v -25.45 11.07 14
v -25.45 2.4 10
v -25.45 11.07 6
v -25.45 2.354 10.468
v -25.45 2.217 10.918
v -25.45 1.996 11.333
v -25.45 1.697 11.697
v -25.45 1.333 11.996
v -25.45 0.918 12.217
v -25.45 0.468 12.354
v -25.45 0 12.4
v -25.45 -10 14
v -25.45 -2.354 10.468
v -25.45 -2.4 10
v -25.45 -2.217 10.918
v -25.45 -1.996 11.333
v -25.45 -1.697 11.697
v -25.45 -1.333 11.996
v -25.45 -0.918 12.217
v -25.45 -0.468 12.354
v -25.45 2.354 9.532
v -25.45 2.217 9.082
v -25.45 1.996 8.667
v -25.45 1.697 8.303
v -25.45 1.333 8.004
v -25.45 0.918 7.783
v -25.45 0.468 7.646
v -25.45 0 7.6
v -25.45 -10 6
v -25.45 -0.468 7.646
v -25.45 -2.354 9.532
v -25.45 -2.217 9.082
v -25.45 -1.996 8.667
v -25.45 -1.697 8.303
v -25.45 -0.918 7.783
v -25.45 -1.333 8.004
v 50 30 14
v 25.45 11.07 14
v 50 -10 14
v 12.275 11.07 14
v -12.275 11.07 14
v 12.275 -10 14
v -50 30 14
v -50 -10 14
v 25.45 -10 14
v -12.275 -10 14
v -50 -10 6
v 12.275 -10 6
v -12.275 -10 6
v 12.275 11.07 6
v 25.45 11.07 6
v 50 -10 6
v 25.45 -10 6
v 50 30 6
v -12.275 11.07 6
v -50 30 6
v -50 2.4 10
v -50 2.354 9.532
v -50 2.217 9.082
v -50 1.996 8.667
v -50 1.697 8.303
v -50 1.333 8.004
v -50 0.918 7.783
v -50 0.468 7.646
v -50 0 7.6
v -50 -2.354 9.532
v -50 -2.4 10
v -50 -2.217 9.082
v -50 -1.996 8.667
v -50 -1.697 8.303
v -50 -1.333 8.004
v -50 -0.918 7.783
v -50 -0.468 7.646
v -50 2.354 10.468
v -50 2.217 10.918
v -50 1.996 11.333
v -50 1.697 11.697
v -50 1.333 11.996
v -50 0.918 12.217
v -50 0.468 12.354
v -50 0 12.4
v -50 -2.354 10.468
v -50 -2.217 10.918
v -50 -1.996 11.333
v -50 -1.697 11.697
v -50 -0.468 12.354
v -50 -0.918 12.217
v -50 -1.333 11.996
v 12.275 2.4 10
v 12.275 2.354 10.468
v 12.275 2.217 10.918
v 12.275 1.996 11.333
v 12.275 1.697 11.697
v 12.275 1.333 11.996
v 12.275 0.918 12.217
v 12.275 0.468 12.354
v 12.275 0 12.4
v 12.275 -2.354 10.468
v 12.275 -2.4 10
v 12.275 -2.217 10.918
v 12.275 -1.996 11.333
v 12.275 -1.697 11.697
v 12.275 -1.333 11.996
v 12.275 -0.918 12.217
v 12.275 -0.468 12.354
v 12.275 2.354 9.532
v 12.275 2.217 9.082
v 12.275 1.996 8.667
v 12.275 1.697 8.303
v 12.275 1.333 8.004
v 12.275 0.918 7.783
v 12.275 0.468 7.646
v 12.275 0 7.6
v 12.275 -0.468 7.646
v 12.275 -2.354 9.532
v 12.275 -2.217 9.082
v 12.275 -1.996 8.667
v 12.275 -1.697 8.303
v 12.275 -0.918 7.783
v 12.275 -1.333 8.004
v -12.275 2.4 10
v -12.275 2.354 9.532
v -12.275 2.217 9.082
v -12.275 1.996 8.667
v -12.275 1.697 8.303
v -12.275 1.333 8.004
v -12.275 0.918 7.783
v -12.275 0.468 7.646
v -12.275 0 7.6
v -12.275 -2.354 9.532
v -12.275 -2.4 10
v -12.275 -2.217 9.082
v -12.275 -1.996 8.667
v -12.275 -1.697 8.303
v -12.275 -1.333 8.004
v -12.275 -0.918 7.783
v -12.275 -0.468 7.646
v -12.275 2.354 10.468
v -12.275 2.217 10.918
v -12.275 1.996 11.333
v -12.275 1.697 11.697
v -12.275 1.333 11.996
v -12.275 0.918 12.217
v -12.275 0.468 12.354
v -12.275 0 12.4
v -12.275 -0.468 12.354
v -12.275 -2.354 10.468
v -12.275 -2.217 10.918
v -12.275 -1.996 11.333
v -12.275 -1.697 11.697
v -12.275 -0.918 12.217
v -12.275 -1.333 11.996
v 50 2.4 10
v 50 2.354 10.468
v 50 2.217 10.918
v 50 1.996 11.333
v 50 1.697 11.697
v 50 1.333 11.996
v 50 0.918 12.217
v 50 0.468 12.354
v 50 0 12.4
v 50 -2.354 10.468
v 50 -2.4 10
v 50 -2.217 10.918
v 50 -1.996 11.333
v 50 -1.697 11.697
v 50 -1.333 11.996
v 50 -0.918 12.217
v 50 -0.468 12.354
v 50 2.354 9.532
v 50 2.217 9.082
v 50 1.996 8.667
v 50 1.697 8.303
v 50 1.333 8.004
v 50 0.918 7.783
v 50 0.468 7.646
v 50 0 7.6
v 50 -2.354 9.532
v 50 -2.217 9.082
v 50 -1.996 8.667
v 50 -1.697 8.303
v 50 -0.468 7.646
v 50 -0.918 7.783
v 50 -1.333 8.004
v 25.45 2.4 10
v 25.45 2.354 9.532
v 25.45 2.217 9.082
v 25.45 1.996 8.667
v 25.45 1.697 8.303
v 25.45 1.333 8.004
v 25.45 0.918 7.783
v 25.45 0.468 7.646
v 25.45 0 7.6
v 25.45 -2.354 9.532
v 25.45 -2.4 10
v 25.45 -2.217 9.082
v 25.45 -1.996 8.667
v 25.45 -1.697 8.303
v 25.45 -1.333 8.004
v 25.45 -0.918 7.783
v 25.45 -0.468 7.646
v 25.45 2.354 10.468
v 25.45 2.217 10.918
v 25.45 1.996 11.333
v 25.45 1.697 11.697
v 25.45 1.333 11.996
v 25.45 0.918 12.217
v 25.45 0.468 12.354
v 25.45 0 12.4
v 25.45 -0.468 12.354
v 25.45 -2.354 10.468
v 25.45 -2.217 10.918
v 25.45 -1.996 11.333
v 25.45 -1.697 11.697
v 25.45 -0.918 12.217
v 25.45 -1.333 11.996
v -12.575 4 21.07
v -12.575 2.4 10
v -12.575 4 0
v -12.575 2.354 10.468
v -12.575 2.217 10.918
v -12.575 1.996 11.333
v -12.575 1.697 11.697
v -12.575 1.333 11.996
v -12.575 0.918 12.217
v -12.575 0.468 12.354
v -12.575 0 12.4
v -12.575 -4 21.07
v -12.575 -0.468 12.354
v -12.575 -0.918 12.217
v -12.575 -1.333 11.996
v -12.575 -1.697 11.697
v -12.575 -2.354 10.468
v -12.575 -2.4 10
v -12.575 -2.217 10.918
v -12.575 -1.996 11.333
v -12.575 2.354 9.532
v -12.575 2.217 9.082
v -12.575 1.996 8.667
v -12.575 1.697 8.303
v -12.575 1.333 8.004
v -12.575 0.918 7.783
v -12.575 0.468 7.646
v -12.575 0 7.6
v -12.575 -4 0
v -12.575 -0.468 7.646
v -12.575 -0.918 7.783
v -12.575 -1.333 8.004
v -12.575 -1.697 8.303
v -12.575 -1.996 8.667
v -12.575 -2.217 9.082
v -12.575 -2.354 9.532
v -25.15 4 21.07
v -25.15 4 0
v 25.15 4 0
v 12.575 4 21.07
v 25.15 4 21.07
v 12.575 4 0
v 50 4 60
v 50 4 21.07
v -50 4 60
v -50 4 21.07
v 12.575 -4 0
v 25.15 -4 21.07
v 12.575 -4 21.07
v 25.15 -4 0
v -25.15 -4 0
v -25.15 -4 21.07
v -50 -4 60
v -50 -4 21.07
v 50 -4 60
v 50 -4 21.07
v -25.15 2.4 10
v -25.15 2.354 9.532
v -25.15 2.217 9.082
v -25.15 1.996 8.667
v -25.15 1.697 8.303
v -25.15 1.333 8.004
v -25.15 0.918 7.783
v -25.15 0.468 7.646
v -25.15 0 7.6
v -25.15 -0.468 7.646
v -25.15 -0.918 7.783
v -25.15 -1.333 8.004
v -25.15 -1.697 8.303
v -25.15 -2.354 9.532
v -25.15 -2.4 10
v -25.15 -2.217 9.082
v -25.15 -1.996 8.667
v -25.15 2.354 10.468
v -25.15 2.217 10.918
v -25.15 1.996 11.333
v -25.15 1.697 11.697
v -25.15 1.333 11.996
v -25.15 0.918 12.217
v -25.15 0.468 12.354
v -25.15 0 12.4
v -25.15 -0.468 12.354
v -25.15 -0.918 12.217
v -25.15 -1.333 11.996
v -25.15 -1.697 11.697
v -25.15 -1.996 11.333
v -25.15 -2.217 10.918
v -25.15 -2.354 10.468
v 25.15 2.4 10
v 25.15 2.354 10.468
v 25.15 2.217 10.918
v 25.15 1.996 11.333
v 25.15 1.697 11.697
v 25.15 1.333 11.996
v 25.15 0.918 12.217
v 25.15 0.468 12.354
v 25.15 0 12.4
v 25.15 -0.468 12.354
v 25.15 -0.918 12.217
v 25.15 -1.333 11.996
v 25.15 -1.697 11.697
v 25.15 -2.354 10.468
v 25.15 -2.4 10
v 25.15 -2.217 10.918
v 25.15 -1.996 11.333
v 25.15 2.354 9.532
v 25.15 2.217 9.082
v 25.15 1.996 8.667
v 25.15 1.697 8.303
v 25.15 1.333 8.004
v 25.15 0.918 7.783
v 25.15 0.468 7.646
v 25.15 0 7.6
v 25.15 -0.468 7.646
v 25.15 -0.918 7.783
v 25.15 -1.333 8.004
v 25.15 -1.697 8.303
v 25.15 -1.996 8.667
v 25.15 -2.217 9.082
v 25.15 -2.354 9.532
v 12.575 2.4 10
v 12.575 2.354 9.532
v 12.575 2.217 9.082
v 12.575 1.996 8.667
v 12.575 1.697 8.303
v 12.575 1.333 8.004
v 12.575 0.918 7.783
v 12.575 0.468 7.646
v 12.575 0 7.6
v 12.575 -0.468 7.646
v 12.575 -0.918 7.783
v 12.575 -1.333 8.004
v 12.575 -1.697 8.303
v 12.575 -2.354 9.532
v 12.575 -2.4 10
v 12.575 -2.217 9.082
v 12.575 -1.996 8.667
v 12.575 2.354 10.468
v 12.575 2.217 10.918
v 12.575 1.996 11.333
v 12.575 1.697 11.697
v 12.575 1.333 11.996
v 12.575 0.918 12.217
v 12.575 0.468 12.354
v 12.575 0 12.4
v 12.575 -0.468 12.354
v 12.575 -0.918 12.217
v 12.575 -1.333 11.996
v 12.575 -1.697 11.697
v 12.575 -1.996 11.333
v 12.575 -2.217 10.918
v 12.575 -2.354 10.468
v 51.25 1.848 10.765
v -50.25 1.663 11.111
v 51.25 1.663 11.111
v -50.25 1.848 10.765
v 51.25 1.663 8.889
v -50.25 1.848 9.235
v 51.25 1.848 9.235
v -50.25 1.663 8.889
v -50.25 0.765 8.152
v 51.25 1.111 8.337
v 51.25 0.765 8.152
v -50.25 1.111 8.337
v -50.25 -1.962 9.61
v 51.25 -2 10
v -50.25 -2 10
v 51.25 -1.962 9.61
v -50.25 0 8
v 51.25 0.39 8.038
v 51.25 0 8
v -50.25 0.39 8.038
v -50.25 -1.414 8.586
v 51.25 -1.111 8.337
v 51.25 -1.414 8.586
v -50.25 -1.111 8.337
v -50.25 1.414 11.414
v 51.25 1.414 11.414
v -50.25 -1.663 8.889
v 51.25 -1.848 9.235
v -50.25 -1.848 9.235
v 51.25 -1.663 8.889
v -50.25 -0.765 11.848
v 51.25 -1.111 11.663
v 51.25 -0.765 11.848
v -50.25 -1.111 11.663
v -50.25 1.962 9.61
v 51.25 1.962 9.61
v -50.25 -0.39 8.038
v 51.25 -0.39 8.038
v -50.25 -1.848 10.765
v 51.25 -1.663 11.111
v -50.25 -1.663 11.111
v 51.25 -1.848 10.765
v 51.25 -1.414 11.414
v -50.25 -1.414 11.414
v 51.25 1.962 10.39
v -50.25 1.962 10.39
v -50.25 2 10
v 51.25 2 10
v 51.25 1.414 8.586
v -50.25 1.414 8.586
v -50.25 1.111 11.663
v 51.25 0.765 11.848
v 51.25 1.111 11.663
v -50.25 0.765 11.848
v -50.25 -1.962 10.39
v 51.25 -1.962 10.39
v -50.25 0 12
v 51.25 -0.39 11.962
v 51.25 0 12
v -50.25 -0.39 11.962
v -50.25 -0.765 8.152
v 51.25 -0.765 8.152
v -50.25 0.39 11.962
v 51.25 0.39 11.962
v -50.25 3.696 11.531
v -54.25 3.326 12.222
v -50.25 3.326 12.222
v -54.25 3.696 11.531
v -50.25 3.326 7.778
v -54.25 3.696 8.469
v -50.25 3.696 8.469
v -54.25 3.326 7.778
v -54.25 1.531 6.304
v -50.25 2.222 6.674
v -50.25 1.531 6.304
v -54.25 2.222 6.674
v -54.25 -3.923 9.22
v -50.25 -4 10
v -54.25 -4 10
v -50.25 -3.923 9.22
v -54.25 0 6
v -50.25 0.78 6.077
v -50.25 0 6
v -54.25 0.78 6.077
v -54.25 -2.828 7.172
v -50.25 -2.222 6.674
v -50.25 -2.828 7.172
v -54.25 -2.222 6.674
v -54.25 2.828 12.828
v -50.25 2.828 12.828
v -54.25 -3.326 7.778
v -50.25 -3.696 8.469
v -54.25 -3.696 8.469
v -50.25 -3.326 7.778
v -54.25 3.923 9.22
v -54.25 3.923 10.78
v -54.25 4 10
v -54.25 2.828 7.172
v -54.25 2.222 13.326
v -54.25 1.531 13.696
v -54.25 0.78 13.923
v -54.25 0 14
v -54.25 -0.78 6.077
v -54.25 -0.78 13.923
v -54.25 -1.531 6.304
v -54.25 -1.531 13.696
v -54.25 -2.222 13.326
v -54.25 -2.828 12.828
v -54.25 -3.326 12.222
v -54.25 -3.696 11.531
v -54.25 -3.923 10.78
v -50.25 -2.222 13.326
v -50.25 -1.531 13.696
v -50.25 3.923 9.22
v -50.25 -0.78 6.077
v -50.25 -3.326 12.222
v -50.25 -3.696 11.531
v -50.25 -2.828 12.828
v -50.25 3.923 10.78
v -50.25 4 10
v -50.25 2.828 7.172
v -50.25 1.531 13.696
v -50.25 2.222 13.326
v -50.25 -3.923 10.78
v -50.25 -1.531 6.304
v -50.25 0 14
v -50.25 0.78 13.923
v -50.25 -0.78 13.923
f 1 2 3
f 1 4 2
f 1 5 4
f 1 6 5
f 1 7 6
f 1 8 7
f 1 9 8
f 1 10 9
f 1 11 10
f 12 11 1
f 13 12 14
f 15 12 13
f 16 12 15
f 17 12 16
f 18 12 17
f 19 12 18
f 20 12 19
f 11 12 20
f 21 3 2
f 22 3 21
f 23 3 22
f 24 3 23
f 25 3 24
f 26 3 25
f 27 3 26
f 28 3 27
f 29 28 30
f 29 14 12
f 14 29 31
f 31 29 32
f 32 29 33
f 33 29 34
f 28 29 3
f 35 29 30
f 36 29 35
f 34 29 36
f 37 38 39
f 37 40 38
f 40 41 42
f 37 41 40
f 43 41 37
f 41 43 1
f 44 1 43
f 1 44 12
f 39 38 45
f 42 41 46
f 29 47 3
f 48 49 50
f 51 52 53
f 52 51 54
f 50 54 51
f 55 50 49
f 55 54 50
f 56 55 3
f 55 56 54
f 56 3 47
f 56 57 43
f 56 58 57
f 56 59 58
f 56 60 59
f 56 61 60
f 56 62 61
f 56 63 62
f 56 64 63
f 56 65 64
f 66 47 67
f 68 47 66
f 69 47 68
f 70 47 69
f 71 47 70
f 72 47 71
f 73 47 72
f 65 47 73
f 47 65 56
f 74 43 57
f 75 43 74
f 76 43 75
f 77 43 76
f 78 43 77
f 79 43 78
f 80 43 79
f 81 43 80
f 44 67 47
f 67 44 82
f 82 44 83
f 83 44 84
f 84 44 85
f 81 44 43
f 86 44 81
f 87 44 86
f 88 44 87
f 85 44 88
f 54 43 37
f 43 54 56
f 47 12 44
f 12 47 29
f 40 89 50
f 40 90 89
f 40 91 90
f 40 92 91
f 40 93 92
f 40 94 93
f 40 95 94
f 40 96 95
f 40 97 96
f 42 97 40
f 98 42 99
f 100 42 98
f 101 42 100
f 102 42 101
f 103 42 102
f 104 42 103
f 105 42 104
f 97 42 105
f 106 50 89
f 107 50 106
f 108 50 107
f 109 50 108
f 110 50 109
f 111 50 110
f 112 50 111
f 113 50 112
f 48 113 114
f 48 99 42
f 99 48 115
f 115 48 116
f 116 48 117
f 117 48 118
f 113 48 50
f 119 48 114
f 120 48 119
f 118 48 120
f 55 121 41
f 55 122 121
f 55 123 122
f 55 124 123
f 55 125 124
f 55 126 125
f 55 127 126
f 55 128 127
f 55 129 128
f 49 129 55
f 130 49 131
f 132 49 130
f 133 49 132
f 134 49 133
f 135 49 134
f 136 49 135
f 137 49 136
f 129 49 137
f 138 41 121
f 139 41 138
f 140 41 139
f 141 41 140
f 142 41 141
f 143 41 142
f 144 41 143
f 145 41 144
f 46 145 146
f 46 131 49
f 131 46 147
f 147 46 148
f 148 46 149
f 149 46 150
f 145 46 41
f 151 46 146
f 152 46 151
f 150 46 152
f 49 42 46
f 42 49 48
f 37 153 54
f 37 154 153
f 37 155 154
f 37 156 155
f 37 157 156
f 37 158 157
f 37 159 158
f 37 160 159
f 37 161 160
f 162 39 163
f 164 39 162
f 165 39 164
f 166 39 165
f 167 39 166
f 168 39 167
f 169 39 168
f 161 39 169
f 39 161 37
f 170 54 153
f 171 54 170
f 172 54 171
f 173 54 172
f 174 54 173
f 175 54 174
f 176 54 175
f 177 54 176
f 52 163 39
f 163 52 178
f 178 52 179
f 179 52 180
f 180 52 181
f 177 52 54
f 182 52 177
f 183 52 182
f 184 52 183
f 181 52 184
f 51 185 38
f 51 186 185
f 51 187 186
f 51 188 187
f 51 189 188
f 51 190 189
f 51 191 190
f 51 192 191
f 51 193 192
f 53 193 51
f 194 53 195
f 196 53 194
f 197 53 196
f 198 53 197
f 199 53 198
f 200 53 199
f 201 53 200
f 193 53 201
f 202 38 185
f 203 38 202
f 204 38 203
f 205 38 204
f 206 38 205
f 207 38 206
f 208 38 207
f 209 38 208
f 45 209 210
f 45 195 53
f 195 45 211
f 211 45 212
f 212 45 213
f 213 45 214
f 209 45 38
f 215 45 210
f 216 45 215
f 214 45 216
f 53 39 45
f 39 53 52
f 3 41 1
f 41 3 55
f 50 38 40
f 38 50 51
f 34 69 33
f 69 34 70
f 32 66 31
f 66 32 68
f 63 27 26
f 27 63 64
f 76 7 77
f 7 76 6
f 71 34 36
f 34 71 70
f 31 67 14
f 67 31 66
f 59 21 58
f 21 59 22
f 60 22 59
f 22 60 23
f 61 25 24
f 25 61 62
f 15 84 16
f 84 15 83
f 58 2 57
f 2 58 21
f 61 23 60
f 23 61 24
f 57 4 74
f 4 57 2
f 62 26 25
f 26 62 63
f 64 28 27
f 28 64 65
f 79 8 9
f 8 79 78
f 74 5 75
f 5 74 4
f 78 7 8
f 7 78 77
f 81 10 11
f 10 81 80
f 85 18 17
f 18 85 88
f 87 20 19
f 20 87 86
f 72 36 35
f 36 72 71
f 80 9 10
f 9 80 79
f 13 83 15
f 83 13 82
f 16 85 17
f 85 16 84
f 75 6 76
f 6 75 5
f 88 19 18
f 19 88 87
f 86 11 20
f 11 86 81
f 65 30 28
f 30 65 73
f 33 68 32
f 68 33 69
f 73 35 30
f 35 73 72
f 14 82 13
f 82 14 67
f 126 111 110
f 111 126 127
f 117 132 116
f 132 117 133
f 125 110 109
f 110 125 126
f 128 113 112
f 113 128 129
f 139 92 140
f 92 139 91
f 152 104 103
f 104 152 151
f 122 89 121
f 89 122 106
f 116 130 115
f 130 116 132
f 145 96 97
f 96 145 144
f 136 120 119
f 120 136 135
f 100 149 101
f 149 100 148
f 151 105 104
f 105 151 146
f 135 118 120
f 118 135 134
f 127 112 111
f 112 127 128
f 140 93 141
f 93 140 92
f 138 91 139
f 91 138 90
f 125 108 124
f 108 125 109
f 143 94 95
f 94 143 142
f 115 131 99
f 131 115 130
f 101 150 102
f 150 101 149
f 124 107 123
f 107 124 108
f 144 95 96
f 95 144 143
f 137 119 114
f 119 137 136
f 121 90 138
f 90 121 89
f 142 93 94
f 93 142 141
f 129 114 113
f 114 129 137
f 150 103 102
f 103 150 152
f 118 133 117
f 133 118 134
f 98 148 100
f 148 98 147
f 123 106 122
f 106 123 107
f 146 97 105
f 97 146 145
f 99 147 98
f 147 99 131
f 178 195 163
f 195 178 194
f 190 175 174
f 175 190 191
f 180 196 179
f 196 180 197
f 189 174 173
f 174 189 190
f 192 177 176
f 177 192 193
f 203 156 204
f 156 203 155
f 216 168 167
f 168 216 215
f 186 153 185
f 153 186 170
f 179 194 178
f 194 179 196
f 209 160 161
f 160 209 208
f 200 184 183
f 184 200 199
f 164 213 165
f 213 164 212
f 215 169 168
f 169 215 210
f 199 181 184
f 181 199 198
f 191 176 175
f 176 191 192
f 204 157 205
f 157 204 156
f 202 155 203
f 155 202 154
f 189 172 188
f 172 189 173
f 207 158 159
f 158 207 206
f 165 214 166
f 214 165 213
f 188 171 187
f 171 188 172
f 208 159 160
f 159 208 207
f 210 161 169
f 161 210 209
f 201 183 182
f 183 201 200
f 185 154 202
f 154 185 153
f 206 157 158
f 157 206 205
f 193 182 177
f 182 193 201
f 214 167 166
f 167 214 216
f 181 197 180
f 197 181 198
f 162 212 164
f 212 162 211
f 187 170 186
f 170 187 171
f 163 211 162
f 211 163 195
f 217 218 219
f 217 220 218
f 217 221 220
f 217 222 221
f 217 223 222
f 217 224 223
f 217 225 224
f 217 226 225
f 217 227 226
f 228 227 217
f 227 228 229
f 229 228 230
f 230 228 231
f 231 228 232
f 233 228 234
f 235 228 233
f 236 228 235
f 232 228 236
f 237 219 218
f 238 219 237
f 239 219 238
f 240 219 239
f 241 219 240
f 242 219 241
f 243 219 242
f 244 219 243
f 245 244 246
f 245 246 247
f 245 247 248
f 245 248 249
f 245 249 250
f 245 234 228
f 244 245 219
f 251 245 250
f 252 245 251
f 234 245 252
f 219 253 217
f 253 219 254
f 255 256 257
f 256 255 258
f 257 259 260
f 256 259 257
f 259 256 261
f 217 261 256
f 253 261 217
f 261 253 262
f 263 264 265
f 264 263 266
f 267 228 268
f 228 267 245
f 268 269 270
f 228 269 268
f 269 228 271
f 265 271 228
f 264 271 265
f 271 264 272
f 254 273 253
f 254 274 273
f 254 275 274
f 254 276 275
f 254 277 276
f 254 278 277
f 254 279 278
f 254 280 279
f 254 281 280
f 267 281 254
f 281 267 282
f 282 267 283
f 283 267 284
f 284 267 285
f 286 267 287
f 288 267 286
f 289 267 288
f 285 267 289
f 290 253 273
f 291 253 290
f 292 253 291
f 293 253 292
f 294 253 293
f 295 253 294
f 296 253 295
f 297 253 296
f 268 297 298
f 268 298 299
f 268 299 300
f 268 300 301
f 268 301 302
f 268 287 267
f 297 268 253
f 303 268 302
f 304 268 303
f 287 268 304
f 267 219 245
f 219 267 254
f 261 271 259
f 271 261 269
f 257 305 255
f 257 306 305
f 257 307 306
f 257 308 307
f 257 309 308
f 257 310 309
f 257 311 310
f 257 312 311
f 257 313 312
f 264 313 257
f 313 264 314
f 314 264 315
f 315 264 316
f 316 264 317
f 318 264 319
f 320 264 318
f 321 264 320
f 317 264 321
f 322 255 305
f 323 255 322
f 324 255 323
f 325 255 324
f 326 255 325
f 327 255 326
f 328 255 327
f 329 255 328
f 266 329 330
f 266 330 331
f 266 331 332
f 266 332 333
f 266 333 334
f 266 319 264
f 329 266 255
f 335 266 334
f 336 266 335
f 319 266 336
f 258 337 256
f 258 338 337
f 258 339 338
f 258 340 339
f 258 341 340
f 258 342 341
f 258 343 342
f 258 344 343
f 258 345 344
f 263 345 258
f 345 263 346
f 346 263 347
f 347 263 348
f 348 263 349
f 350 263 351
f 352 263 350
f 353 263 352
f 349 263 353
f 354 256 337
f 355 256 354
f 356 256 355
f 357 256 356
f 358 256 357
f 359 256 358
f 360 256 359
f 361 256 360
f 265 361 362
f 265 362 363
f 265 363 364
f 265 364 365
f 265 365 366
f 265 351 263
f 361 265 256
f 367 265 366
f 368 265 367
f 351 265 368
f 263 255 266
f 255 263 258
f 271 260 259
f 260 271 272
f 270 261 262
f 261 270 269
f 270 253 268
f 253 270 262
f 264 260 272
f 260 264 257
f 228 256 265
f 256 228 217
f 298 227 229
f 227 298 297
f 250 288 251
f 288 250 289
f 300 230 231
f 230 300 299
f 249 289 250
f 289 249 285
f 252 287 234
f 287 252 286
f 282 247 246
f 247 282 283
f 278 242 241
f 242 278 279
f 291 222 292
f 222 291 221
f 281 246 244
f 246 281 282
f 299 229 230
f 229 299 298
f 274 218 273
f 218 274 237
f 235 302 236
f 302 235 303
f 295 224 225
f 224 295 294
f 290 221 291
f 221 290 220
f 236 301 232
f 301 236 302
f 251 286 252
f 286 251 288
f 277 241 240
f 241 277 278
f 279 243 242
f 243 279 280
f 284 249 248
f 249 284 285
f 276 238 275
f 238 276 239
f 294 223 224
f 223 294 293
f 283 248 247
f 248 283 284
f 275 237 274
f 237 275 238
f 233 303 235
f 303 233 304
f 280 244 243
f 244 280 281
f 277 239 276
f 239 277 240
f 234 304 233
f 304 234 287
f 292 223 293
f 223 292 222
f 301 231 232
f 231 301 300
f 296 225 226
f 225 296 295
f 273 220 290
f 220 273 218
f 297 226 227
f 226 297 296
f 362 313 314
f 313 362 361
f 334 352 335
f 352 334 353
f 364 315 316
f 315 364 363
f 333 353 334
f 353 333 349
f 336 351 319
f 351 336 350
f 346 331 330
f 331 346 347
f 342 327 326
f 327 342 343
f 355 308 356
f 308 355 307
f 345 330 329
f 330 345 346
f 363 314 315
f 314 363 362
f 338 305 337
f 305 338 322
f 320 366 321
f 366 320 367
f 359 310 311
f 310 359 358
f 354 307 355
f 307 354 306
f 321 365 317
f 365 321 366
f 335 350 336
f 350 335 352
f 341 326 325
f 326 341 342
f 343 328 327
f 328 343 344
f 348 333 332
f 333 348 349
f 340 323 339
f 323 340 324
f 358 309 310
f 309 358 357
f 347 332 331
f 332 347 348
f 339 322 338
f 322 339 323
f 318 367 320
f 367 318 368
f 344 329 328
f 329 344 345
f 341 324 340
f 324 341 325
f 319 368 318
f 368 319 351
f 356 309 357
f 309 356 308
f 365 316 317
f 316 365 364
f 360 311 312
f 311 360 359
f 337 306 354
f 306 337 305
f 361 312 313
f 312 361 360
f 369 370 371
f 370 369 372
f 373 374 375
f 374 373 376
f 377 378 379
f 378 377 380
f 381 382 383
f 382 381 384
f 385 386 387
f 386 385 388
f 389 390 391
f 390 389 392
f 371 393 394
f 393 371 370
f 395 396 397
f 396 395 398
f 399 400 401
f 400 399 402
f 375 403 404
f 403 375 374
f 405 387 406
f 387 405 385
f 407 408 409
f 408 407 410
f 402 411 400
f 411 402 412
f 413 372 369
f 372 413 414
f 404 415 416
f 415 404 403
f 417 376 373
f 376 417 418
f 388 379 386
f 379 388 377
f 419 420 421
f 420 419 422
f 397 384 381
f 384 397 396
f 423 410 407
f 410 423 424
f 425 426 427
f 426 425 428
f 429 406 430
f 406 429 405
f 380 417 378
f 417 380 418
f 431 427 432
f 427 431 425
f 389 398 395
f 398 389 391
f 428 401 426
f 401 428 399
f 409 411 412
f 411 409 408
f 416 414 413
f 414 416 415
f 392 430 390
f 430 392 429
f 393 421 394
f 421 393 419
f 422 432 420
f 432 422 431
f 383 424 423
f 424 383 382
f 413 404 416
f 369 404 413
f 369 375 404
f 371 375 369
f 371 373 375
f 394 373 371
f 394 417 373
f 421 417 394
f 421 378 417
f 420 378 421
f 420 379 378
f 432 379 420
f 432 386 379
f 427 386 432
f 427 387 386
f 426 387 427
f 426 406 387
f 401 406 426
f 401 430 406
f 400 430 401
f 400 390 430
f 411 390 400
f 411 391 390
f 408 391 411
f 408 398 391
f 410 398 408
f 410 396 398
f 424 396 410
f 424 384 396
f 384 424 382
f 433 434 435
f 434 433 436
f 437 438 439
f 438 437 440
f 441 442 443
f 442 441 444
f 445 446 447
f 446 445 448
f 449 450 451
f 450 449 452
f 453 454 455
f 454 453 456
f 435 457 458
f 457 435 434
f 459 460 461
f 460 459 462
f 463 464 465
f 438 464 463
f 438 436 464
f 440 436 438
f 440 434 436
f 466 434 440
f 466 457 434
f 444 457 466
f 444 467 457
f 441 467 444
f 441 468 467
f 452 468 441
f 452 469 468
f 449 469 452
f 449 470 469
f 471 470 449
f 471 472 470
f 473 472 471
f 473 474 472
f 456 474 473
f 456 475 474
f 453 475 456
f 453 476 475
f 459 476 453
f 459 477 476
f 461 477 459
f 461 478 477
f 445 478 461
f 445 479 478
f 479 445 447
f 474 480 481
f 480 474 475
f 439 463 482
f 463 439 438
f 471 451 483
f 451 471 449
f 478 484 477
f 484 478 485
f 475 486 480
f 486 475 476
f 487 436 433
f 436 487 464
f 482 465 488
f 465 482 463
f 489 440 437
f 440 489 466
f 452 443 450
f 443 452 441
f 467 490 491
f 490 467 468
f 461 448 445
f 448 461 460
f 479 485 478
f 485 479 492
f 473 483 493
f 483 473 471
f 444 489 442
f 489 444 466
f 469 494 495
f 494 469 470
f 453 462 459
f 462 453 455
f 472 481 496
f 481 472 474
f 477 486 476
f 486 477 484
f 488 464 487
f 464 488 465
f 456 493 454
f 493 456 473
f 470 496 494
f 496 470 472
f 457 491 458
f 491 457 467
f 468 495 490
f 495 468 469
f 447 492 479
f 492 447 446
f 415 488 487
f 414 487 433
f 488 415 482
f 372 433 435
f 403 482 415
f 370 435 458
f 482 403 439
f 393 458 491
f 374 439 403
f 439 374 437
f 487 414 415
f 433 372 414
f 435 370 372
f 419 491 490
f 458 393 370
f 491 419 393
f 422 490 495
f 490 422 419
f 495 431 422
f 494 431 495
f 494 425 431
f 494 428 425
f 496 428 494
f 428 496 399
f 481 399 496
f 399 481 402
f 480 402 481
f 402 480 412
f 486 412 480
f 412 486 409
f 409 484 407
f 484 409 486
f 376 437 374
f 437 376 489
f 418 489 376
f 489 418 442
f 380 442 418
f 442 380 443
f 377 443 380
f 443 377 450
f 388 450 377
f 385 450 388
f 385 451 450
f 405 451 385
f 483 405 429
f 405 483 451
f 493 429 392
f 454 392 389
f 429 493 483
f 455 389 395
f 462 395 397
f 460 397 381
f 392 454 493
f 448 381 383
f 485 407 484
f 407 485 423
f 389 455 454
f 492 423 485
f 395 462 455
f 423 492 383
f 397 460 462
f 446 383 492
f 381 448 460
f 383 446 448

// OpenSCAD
$fn = 32;

// ------------------------------------------------------------------------
// Butt hinge: hinge 100 mm, leaf swung 270 deg
// Every part is its own module, assembly() places every instance.
// ------------------------------------------------------------------------

// --- part 1 ---
module hinge_base() {
  difference() {
    union() {
      translate([-50, -10, -4]) cube([24.55, 40, 8]);
      translate([-12.275, -10, -4]) cube([24.55, 40, 8]);
      translate([25.45, -10, -4]) cube([24.55, 40, 8]);
      translate([-50, 11.07, -4]) cube([100, 18.93, 8]);
    }
    translate([-37.725, 0, 0]) rotate([0, 90, 0]) cylinder(h = 26.55, d = 4.8, center = true);
    translate([0, 0, 0]) rotate([0, 90, 0]) cylinder(h = 26.55, d = 4.8, center = true);
    translate([37.725, 0, 0]) rotate([0, 90, 0]) cylinder(h = 26.55, d = 4.8, center = true);
  }
}

// --- part 2 ---
module hinge_mover() {
  difference() {
    union() {
      translate([-25.15, -50, -4]) cube([12.575, 60, 8]);
      translate([12.575, -50, -4]) cube([12.575, 60, 8]);
      translate([-50, -50, -4]) cube([100, 38.93, 8]);
    }
    translate([-18.863, 0, 0]) rotate([0, 90, 0]) cylinder(h = 14.575, d = 4.8, center = true);
    translate([18.863, 0, 0]) rotate([0, 90, 0]) cylinder(h = 14.575, d = 4.8, center = true);
  }
}

// --- part 3 ---
module hinge_pin() {
  rotate([0, 90, 0]) cylinder(h = 102.5, d = 4, center = true);
  translate([-54.25, 0, 0]) rotate([0, 90, 0]) cylinder(h = 4, d = 8);
}

// --- assembly ---
module assembly() {
  color([0.80, 0.24, 0.20]) translate([0, 0, 10]) rotate([0, 0, 0]) hinge_base();
  color([0.20, 0.45, 0.75]) translate([0, 0, 10]) rotate([270, 0, 0]) hinge_mover();
  color([0.25, 0.62, 0.32]) translate([0, 0, 10]) rotate([0, 0, 0]) hinge_pin();
}

assembly();
